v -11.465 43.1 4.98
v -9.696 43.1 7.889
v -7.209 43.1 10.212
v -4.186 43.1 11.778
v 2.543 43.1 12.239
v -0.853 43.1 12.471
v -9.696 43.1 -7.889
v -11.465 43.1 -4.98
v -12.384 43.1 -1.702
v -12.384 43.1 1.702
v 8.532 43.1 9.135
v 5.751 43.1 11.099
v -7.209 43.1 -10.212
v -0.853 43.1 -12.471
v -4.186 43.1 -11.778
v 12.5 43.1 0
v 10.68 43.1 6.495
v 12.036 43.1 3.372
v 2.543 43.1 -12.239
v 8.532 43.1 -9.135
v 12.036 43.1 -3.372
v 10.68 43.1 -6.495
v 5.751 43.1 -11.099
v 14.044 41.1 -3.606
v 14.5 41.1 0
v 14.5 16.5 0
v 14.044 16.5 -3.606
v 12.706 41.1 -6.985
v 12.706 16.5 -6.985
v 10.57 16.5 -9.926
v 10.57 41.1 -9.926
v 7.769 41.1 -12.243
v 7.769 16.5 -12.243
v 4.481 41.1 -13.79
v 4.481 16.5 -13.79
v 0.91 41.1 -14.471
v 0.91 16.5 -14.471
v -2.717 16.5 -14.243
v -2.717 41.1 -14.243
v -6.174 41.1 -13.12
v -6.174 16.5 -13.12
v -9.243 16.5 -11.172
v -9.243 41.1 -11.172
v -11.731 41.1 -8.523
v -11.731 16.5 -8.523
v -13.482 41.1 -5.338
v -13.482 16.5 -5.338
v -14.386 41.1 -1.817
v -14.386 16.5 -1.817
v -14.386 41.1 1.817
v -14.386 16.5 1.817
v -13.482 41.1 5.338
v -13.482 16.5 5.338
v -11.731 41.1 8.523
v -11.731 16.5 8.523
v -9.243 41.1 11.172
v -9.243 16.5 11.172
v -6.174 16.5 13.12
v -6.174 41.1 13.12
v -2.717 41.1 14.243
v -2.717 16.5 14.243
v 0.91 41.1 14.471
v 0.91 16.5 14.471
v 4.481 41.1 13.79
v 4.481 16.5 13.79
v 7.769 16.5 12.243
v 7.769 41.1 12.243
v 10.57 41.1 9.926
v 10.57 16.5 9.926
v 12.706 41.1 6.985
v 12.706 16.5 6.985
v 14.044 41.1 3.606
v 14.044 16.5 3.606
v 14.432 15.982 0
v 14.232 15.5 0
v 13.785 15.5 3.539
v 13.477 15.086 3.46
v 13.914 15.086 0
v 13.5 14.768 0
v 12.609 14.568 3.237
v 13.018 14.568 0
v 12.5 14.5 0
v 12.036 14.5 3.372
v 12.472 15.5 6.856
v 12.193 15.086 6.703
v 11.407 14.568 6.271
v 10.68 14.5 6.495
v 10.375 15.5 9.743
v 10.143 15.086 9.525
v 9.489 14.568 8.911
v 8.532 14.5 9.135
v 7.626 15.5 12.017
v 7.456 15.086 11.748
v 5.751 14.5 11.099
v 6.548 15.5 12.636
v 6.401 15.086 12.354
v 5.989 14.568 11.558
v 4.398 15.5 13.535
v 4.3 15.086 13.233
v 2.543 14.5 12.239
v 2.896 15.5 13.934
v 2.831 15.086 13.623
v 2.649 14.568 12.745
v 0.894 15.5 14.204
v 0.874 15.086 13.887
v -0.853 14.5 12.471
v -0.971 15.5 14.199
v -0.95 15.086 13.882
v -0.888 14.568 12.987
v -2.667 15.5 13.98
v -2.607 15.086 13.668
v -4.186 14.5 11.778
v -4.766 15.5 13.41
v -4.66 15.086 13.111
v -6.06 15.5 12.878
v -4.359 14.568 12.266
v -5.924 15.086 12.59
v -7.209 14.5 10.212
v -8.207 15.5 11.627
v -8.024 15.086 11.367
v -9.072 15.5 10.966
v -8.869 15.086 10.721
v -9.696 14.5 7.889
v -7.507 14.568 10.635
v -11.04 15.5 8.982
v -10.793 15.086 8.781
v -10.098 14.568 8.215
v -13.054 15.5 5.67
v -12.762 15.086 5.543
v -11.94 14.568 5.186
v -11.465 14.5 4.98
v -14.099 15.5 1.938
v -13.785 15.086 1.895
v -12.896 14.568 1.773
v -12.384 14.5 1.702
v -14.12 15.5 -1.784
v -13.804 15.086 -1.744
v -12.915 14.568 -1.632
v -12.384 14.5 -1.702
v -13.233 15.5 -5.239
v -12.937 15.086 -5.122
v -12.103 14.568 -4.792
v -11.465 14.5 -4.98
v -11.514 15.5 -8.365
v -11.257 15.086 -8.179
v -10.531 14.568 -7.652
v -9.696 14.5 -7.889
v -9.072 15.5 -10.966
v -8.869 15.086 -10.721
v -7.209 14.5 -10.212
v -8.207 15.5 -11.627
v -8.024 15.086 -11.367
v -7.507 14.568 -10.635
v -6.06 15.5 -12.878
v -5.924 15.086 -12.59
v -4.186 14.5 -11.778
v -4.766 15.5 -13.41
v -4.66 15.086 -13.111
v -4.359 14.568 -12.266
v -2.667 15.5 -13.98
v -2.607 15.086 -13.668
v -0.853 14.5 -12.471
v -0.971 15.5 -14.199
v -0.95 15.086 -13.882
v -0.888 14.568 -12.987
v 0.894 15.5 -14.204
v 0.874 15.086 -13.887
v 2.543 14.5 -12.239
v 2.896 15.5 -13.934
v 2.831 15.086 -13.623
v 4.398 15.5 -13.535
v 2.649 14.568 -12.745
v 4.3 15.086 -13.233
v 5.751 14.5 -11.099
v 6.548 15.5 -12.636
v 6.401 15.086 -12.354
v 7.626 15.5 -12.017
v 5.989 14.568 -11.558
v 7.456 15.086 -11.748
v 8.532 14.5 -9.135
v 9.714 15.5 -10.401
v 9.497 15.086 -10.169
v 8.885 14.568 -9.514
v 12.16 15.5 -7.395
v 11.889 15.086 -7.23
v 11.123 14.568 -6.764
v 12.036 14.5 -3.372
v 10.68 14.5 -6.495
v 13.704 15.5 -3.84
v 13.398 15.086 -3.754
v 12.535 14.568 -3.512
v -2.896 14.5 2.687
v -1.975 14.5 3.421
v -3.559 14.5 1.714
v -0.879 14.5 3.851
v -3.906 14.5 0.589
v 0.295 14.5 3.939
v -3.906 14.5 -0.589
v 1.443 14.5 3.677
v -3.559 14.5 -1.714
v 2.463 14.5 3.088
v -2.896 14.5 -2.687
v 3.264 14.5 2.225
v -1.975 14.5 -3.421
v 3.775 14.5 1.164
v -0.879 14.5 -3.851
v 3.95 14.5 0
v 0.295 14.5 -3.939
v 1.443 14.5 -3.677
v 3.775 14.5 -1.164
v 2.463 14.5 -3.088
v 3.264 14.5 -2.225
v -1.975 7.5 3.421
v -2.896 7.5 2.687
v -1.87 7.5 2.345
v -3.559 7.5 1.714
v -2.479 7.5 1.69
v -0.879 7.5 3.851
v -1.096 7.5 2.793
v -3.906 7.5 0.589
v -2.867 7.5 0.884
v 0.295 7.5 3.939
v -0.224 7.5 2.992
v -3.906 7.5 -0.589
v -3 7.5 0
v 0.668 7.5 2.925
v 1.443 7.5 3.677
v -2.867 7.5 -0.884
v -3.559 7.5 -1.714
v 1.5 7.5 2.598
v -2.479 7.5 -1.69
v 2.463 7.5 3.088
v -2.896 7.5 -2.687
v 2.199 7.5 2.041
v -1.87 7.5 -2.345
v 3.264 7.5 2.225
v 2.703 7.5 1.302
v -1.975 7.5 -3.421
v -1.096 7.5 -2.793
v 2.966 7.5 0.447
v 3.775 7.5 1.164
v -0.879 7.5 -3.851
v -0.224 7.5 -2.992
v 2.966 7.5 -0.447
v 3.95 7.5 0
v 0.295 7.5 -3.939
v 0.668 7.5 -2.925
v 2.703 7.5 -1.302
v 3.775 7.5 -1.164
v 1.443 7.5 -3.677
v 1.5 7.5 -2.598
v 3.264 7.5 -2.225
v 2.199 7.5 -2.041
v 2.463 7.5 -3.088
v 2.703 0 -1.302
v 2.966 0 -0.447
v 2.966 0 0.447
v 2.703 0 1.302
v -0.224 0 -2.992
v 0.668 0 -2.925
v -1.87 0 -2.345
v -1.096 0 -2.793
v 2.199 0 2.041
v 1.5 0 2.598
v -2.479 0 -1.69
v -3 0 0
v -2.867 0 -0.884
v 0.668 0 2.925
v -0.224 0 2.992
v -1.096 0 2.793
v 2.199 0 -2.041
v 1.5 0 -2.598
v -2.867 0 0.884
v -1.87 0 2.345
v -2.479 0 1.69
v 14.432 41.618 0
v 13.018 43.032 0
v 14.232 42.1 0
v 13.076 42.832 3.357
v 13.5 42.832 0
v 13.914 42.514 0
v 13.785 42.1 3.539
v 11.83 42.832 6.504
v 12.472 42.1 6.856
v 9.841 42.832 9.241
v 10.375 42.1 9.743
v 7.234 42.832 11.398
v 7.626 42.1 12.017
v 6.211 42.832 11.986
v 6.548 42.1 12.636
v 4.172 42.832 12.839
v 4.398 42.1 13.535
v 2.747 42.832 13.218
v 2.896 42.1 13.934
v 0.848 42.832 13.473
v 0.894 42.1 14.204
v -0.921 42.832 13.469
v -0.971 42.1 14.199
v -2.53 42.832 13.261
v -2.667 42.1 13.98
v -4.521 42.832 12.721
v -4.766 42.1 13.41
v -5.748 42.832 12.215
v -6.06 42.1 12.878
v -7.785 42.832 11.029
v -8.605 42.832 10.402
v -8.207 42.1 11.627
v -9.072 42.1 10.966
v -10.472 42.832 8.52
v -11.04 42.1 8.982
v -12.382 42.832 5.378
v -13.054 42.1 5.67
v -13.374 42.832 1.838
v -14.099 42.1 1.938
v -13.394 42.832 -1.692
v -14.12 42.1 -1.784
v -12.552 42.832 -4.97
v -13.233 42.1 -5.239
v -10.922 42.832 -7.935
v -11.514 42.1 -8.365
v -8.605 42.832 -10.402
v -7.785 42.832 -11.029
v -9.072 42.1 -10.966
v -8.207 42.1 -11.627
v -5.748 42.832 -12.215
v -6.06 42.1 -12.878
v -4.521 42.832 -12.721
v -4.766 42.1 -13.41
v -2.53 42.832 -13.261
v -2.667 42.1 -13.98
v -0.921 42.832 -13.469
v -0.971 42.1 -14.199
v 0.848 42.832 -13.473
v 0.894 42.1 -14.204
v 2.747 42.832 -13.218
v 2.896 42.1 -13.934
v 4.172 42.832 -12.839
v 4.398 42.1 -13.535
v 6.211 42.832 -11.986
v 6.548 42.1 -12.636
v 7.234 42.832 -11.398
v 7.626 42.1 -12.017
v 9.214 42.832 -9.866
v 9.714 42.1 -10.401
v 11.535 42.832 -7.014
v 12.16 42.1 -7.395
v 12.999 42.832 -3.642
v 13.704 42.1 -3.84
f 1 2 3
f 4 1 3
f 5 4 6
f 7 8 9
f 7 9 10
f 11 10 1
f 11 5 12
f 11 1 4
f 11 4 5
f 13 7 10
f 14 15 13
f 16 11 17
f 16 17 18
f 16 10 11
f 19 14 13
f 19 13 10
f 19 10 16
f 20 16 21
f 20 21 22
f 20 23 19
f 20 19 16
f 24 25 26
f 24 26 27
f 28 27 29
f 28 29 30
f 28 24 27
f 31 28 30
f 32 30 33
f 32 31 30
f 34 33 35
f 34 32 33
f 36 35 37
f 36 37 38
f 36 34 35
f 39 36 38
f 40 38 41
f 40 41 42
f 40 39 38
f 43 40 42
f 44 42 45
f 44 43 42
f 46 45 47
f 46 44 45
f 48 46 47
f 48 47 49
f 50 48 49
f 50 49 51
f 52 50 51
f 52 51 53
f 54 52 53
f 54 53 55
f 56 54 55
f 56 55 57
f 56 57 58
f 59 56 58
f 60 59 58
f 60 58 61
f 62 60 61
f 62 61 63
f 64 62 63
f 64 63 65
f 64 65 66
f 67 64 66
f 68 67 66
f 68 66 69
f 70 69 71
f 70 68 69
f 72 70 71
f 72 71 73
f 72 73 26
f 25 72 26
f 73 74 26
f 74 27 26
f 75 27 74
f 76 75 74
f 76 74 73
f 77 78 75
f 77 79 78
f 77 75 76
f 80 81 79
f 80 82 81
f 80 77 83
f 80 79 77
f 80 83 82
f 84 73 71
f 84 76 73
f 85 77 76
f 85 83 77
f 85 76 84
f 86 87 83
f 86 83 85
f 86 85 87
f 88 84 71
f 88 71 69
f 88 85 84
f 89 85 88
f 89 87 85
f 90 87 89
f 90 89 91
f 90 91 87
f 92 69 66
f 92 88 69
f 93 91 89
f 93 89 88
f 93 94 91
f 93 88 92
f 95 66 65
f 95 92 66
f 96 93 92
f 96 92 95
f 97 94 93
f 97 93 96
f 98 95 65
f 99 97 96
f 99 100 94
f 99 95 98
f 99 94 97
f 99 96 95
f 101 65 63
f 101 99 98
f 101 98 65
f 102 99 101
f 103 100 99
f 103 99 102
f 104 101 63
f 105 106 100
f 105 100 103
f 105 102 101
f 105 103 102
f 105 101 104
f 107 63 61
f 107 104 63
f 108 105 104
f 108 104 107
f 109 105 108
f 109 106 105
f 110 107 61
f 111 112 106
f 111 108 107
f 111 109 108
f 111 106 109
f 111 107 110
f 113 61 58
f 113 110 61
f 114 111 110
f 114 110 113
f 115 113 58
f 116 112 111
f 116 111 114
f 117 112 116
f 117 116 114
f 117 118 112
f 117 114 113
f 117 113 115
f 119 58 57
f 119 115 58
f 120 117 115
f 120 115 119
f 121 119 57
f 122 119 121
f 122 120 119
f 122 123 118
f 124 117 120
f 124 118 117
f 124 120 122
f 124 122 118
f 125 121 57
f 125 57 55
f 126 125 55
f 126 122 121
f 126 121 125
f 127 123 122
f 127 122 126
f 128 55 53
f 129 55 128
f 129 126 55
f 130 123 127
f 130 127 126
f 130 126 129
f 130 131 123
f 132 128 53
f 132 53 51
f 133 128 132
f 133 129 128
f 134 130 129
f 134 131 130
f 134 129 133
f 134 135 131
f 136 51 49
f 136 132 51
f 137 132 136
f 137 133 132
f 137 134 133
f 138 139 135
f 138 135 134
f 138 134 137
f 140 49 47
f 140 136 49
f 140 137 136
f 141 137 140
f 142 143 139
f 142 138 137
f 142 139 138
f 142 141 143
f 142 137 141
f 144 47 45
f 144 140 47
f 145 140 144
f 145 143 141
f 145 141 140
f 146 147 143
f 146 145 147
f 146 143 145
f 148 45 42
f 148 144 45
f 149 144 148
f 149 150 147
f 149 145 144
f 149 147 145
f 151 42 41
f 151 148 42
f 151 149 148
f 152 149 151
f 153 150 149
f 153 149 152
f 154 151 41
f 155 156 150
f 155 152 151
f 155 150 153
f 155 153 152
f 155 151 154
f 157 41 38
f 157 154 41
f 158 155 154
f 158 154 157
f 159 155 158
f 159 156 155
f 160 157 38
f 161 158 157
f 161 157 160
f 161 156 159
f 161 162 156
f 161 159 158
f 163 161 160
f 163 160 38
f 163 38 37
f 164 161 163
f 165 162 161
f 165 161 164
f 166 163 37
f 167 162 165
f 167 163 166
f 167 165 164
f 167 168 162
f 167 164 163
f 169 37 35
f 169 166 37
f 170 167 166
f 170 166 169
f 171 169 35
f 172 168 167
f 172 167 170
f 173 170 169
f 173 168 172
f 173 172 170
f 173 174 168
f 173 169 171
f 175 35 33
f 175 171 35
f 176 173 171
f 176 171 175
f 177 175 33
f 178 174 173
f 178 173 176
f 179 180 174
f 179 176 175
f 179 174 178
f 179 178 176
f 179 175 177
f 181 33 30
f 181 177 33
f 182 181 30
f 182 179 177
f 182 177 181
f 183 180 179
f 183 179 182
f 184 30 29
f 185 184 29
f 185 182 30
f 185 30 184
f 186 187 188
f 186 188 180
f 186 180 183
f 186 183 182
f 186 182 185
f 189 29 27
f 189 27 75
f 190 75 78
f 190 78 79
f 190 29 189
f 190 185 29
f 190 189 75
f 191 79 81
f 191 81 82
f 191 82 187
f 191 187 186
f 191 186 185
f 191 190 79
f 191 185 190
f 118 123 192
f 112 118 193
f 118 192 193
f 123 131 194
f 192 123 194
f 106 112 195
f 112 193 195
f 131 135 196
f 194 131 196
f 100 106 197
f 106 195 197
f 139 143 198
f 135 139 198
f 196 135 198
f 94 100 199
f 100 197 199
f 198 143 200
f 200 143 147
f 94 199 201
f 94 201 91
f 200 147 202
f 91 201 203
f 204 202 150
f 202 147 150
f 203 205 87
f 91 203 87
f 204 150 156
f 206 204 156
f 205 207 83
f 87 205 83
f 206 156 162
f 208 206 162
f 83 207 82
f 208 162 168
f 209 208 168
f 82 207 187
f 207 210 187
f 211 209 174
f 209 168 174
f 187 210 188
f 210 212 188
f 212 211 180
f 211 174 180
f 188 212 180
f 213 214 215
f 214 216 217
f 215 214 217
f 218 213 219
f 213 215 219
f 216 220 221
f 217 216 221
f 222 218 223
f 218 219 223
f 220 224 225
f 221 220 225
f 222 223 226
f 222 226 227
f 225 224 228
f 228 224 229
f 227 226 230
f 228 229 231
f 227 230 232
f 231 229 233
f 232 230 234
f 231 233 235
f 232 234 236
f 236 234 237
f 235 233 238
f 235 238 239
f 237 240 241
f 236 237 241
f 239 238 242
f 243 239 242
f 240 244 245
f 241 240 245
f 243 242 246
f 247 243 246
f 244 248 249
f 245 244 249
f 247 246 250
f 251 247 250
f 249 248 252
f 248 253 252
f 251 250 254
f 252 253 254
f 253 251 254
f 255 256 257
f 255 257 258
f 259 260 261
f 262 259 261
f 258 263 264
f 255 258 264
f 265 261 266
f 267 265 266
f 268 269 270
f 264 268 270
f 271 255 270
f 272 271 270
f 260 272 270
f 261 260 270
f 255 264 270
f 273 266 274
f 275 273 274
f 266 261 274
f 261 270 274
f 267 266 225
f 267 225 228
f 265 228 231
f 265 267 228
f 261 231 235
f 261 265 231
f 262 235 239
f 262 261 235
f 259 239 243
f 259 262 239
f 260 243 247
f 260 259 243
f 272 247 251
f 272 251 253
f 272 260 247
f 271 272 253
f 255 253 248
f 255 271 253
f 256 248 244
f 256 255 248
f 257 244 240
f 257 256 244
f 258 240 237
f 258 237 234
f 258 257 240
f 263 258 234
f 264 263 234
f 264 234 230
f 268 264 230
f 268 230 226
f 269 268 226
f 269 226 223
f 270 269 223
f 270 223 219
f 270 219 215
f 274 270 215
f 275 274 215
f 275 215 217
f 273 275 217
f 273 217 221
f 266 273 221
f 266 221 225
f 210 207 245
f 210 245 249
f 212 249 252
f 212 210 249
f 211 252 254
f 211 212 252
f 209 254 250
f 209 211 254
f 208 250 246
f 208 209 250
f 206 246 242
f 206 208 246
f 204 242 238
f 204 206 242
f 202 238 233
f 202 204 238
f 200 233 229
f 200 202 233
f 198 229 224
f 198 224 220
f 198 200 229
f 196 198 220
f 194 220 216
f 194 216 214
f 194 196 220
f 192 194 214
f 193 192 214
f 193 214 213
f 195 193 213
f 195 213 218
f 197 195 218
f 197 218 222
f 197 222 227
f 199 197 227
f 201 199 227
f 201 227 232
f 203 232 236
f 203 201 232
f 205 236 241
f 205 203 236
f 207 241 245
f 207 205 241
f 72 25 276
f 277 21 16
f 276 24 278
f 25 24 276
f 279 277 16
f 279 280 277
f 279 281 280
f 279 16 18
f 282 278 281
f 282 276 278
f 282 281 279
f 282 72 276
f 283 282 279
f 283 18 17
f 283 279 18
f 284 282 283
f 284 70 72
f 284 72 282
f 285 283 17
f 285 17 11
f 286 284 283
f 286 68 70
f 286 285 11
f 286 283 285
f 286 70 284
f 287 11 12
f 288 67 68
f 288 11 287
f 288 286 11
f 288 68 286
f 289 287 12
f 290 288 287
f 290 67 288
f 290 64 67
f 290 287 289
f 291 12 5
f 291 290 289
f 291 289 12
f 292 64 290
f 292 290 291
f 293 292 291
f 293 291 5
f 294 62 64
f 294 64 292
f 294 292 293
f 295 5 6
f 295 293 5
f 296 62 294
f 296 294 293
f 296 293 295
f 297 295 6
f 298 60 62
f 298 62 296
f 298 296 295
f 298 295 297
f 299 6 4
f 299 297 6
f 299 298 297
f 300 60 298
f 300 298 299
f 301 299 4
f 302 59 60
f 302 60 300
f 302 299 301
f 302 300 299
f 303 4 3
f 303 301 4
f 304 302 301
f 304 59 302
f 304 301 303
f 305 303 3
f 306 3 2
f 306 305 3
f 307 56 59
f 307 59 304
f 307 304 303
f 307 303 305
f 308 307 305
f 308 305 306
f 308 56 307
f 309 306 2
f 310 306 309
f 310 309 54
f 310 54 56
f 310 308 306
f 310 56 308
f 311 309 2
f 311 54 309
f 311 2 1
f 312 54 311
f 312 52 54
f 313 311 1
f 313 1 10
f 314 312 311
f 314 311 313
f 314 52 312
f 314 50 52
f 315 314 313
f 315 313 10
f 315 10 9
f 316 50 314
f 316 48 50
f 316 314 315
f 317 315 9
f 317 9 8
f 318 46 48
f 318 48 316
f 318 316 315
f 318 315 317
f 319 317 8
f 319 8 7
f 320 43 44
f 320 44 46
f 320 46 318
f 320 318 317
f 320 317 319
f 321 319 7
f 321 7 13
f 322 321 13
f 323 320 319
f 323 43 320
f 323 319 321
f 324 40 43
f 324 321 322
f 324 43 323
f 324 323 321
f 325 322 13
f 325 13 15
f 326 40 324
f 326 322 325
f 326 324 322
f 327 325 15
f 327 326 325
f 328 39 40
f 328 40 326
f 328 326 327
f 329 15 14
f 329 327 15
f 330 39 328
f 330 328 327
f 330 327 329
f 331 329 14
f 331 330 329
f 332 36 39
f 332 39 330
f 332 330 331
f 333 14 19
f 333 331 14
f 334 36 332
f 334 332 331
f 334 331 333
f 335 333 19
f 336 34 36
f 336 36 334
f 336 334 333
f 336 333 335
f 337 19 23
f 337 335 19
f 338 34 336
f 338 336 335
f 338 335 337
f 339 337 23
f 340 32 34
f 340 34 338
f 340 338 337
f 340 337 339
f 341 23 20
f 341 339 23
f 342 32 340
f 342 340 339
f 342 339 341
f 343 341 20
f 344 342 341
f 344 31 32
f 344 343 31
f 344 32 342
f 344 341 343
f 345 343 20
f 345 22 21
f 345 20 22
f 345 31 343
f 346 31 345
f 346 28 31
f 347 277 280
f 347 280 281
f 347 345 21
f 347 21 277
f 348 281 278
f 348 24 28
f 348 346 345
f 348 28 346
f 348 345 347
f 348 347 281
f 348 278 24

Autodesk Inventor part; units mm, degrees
ref_plane "YZ Plane" through (0, 0, 0) normal (1, 0, 0) x (0, 1, 0)
ref_plane "XZ Plane" through (0, 0, 0) normal (0, 1, 0) x (-1, 0, 0)
ref_plane "XY Plane" through (0, 0, 0) normal (0, 0, 1) x (1, 0, 0)
sketch "Sketch1" plane through (0, 0, 0) normal (0, 1, 0) x (-1, 0, 0)
  circle A0 centre (0, 0) radius 3
  dimension "d2" = 6
extrude "Extrusion1" add sketch "Sketch1" along normal blind 43.1
thread "Thread1" size "M6x1" class "6g" standard "ANSI Metric M Profile" length 7.5
sketch "Sketch3" plane through (0, 43.1, 0) normal (0, 1, 0) x (1, 0, 0)
  circle A0 centre (0, 0) radius 14.5
  dimension "d7" = 29
extrude "Extrusion2" add sketch "Sketch3" against normal blind 28.6
sketch "Sketch4" plane through (0, 43.1, 0) normal (0, 1, 0) x (1, 0, 0)
  circle A0 centre (0, 0) radius 3.95
  dimension "d10" = 7.9
extrude "Extrusion3" add sketch "Sketch4" against normal blind 35.6
fillet "Fillet1" radius 2 2 edges at (-14.5, 14.5, 0) (-14.5, 43.1, 0)
properties part number "bldc MOTOR"
